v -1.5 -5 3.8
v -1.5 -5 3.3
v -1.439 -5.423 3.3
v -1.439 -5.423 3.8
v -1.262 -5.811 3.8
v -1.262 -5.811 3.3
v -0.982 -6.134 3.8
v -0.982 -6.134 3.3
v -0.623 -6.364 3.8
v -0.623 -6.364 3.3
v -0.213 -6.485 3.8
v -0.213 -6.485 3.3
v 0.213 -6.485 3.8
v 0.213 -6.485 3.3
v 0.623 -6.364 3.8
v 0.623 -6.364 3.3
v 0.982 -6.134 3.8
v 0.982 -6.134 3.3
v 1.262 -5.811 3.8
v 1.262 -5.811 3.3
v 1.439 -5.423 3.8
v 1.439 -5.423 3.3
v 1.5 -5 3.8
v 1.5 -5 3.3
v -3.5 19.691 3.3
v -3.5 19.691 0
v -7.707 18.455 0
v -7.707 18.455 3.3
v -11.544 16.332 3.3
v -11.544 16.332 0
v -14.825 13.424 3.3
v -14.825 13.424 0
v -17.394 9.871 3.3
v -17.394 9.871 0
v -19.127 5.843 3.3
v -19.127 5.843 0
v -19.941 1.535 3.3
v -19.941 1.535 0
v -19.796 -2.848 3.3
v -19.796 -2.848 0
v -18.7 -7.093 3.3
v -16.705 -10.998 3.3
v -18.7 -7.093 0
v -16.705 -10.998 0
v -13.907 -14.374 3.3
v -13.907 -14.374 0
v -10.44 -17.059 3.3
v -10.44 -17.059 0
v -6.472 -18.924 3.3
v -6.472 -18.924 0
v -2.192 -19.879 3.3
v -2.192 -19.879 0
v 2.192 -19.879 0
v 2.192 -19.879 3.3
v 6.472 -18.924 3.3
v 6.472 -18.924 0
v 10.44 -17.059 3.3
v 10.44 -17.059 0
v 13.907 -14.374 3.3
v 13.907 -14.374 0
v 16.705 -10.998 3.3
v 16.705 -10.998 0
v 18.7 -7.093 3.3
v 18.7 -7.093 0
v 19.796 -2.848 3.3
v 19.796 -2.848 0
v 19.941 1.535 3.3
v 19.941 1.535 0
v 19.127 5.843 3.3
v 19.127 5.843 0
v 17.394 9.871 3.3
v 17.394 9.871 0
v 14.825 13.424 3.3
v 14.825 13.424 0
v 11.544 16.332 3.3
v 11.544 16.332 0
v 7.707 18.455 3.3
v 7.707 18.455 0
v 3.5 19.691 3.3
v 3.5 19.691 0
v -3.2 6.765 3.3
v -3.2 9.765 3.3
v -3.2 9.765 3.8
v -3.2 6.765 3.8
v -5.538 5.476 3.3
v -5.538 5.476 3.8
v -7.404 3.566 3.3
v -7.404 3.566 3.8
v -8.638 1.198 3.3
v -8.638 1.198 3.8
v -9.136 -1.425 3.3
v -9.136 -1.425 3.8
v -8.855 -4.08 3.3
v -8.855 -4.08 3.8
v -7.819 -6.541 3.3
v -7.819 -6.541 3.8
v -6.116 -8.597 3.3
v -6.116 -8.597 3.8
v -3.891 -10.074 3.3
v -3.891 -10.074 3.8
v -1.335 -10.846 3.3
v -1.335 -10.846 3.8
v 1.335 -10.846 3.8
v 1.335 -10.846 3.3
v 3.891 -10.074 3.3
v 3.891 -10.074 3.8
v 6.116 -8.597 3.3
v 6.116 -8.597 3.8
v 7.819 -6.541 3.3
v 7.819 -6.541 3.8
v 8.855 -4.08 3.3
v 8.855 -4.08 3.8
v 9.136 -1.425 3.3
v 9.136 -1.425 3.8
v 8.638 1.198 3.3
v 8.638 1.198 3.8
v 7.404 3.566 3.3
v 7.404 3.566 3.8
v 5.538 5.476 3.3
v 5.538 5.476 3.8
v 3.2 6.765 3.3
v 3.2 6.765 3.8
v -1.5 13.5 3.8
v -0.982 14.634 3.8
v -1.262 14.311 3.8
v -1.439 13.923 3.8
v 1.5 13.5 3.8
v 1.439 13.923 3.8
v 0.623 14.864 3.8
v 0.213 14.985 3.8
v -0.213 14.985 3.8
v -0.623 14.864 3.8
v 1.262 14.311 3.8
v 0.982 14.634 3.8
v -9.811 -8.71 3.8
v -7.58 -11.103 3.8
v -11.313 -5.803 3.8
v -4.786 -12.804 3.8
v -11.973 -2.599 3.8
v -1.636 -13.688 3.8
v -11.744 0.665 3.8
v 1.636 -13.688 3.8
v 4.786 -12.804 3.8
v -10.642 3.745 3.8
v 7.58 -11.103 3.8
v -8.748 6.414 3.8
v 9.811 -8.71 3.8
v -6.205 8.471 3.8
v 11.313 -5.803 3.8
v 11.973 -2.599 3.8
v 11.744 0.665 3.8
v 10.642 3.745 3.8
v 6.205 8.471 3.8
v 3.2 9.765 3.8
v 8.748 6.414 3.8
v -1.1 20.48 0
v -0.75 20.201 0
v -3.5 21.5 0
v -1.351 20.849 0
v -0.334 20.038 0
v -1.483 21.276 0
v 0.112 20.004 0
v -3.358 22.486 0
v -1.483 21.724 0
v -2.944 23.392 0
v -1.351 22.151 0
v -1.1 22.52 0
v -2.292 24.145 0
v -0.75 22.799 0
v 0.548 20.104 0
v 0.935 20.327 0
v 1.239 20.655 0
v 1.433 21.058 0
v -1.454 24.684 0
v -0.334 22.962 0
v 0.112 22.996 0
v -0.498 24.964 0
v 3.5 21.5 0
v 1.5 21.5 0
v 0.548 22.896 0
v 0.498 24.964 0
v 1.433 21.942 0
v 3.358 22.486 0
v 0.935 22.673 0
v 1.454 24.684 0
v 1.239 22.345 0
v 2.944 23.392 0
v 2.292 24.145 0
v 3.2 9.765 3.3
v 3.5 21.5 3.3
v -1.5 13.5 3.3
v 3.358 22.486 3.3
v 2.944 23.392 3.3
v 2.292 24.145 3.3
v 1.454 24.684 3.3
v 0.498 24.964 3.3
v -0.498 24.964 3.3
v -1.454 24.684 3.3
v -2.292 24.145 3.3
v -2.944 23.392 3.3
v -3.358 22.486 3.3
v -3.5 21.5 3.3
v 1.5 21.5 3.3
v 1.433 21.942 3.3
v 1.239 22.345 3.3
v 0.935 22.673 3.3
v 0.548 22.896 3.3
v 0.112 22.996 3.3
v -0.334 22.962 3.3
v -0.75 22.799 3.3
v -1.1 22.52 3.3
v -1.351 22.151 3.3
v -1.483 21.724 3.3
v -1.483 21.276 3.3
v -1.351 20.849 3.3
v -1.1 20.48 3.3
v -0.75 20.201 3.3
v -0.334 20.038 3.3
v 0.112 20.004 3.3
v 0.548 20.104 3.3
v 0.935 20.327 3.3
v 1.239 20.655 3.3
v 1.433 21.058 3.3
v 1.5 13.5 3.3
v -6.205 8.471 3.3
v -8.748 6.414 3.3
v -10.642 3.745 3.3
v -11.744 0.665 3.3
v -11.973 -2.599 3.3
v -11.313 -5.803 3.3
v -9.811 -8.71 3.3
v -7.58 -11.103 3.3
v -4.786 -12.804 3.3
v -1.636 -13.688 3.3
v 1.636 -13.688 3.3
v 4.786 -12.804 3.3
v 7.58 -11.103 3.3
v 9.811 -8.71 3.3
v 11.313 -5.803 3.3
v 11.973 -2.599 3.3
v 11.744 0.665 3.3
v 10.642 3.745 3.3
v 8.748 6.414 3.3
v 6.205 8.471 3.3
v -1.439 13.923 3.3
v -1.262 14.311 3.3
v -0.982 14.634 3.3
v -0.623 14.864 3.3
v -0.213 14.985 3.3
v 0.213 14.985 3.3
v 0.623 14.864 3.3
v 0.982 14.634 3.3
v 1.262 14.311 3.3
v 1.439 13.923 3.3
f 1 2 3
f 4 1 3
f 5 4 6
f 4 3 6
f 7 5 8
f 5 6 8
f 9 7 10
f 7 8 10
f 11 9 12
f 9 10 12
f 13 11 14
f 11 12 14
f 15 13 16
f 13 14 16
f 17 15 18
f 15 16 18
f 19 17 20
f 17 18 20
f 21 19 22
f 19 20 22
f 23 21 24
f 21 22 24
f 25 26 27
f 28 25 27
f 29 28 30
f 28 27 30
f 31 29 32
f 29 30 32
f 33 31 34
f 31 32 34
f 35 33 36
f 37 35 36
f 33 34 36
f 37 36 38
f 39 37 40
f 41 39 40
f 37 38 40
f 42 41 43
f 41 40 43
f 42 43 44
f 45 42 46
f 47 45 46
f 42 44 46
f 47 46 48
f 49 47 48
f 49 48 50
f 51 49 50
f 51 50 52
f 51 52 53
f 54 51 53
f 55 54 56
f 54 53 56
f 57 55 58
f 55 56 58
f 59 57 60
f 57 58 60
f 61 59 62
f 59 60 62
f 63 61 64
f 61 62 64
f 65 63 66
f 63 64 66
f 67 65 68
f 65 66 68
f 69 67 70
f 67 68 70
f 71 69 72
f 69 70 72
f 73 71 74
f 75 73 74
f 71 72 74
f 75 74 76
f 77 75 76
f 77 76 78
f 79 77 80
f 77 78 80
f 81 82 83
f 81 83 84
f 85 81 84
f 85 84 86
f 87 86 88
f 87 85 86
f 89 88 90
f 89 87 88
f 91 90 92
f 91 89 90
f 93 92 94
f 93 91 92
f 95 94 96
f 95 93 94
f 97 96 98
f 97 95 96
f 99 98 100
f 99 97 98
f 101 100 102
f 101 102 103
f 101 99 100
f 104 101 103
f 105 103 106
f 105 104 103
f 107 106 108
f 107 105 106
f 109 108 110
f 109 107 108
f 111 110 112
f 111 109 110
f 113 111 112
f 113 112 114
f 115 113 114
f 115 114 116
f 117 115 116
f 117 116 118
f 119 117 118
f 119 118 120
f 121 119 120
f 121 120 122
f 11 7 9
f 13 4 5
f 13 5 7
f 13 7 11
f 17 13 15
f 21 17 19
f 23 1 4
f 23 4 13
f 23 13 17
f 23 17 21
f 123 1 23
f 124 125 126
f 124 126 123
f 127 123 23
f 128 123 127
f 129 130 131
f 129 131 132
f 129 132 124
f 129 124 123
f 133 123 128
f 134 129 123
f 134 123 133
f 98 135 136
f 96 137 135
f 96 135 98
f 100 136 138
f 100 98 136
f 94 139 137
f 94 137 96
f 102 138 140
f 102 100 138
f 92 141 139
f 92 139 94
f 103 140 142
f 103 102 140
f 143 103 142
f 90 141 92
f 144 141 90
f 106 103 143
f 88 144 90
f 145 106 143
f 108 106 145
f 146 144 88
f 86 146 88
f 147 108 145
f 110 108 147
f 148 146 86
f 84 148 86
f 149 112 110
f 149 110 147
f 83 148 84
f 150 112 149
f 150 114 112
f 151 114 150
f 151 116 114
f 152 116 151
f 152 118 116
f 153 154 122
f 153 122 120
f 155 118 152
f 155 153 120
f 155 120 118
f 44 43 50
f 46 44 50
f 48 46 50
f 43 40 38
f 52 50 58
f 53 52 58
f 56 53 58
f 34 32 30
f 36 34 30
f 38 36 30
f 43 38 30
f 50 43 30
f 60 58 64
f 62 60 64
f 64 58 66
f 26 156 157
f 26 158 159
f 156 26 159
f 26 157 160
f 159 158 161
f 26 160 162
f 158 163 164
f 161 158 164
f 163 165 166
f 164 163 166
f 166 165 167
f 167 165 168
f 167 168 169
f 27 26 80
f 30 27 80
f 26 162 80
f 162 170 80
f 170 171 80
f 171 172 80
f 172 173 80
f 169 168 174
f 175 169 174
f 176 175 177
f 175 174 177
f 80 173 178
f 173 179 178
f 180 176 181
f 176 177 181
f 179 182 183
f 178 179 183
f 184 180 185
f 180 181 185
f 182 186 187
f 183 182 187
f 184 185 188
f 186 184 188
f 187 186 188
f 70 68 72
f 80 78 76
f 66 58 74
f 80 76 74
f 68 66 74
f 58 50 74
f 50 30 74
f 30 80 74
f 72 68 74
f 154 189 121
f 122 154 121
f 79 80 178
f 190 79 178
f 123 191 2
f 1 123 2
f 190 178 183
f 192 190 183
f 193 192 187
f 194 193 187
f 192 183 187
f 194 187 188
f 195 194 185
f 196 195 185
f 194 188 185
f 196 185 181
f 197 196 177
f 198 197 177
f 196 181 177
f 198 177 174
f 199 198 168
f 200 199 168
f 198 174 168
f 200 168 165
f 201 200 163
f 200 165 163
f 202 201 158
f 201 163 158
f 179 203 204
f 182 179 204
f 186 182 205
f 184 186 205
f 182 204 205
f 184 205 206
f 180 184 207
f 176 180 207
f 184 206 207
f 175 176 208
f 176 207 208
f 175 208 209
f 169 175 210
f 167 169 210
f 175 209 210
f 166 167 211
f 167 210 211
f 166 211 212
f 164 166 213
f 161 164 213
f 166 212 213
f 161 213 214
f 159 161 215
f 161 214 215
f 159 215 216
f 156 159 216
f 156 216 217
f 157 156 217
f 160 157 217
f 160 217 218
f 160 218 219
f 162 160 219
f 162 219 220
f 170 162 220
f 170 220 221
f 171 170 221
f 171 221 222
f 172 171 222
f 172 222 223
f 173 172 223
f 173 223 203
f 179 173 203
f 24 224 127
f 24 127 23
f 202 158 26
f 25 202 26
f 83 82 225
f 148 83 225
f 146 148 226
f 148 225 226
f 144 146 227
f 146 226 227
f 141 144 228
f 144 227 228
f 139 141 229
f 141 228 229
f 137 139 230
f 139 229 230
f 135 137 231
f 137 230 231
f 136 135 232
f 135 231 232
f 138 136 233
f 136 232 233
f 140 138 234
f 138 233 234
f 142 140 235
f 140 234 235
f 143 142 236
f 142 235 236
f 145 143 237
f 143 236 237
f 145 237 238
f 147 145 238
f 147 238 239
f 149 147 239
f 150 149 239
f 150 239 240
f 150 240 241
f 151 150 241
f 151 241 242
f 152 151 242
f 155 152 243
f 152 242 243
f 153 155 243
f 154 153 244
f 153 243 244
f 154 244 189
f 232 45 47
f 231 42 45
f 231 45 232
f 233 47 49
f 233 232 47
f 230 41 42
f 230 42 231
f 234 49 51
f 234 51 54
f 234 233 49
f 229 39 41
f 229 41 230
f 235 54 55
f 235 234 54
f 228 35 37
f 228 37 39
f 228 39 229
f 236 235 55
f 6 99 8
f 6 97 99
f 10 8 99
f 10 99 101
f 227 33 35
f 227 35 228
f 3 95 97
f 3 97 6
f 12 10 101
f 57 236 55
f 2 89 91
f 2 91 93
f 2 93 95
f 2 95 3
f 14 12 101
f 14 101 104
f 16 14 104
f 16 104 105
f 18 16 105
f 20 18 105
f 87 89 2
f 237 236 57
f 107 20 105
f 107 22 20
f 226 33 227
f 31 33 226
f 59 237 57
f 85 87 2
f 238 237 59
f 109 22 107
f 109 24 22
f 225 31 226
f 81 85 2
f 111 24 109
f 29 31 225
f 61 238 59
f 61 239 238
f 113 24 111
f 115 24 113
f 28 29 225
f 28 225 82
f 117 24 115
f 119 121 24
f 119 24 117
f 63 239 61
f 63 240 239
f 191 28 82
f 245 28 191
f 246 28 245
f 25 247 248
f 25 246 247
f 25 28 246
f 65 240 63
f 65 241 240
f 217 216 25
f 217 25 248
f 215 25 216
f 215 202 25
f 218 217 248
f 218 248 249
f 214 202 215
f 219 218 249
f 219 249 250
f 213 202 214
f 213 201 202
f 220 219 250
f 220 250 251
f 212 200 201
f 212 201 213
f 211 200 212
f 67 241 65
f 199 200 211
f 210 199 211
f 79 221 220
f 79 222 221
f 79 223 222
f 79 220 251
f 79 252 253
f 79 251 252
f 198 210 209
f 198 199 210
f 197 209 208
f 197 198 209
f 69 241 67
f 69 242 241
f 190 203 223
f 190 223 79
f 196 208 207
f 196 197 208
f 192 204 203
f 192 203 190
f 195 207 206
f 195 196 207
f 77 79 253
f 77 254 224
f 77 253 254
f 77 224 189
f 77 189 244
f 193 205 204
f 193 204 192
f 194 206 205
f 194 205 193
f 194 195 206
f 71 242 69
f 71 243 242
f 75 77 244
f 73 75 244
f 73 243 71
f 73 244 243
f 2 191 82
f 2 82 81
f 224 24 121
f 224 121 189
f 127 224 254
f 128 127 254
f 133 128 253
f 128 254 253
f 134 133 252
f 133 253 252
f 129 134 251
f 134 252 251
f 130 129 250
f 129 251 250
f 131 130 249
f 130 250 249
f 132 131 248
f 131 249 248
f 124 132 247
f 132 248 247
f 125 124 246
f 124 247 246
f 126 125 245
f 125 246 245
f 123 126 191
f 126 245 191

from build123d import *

# Parameters (mm, degrees)
EXTRUDE_DEPTH = 3.3
SKETCH001_R   = 1.5
POCKET_DEPTH  = 3.301
PAD_DEPTH     = 0.5


with BuildPart() as part:
    # Sketch → Extrude (new body)
    with BuildSketch(Plane.XY):
        with BuildLine():
            ThreePointArc((3.5, 21.5), (0, 25), (-3.5, 21.5))
            Line((-3.5, 21.5), (-3.5, 19.691369))
            ThreePointArc((-3.5, 19.691369), (0, -20), (3.5, 19.691369))
            Line((3.5, 19.691369), (3.5, 21.5))
        make_face()
    extrude(amount=EXTRUDE_DEPTH)

    # Sketch001 → Pocket (cut, through all)
    with BuildSketch(Plane.XY.offset(3.3)):
        with Locations((0, 21.5)):
            Circle(SKETCH001_R)
    extrude(amount=-POCKET_DEPTH, mode=Mode.SUBTRACT)

    # Sketch002 → Pad (new body)
    with BuildSketch(Plane.XY.offset(3.3)):
        with BuildLine():
            Line((-1.5, 13.5), (-1.5, -5))
            ThreePointArc((-1.5, -5), (0, -6.5), (1.5, -5))
            Line((1.5, 13.5), (1.5, -5))
            ThreePointArc((1.5, 13.5), (0, 15), (-1.5, 13.5))
        make_face()
        with BuildLine():
            ThreePointArc((-3.2, 9.765466), (0, -13.8), (3.2, 9.765466))
            Line((3.2, 9.765466), (3.2, 6.765466))
            ThreePointArc((-3.2, 6.765466), (0, -10.943698), (3.2, 6.765466))
            Line((-3.2, 9.765466), (-3.2, 6.765466))
        make_face()
    extrude(amount=PAD_DEPTH)


solid = part.part
